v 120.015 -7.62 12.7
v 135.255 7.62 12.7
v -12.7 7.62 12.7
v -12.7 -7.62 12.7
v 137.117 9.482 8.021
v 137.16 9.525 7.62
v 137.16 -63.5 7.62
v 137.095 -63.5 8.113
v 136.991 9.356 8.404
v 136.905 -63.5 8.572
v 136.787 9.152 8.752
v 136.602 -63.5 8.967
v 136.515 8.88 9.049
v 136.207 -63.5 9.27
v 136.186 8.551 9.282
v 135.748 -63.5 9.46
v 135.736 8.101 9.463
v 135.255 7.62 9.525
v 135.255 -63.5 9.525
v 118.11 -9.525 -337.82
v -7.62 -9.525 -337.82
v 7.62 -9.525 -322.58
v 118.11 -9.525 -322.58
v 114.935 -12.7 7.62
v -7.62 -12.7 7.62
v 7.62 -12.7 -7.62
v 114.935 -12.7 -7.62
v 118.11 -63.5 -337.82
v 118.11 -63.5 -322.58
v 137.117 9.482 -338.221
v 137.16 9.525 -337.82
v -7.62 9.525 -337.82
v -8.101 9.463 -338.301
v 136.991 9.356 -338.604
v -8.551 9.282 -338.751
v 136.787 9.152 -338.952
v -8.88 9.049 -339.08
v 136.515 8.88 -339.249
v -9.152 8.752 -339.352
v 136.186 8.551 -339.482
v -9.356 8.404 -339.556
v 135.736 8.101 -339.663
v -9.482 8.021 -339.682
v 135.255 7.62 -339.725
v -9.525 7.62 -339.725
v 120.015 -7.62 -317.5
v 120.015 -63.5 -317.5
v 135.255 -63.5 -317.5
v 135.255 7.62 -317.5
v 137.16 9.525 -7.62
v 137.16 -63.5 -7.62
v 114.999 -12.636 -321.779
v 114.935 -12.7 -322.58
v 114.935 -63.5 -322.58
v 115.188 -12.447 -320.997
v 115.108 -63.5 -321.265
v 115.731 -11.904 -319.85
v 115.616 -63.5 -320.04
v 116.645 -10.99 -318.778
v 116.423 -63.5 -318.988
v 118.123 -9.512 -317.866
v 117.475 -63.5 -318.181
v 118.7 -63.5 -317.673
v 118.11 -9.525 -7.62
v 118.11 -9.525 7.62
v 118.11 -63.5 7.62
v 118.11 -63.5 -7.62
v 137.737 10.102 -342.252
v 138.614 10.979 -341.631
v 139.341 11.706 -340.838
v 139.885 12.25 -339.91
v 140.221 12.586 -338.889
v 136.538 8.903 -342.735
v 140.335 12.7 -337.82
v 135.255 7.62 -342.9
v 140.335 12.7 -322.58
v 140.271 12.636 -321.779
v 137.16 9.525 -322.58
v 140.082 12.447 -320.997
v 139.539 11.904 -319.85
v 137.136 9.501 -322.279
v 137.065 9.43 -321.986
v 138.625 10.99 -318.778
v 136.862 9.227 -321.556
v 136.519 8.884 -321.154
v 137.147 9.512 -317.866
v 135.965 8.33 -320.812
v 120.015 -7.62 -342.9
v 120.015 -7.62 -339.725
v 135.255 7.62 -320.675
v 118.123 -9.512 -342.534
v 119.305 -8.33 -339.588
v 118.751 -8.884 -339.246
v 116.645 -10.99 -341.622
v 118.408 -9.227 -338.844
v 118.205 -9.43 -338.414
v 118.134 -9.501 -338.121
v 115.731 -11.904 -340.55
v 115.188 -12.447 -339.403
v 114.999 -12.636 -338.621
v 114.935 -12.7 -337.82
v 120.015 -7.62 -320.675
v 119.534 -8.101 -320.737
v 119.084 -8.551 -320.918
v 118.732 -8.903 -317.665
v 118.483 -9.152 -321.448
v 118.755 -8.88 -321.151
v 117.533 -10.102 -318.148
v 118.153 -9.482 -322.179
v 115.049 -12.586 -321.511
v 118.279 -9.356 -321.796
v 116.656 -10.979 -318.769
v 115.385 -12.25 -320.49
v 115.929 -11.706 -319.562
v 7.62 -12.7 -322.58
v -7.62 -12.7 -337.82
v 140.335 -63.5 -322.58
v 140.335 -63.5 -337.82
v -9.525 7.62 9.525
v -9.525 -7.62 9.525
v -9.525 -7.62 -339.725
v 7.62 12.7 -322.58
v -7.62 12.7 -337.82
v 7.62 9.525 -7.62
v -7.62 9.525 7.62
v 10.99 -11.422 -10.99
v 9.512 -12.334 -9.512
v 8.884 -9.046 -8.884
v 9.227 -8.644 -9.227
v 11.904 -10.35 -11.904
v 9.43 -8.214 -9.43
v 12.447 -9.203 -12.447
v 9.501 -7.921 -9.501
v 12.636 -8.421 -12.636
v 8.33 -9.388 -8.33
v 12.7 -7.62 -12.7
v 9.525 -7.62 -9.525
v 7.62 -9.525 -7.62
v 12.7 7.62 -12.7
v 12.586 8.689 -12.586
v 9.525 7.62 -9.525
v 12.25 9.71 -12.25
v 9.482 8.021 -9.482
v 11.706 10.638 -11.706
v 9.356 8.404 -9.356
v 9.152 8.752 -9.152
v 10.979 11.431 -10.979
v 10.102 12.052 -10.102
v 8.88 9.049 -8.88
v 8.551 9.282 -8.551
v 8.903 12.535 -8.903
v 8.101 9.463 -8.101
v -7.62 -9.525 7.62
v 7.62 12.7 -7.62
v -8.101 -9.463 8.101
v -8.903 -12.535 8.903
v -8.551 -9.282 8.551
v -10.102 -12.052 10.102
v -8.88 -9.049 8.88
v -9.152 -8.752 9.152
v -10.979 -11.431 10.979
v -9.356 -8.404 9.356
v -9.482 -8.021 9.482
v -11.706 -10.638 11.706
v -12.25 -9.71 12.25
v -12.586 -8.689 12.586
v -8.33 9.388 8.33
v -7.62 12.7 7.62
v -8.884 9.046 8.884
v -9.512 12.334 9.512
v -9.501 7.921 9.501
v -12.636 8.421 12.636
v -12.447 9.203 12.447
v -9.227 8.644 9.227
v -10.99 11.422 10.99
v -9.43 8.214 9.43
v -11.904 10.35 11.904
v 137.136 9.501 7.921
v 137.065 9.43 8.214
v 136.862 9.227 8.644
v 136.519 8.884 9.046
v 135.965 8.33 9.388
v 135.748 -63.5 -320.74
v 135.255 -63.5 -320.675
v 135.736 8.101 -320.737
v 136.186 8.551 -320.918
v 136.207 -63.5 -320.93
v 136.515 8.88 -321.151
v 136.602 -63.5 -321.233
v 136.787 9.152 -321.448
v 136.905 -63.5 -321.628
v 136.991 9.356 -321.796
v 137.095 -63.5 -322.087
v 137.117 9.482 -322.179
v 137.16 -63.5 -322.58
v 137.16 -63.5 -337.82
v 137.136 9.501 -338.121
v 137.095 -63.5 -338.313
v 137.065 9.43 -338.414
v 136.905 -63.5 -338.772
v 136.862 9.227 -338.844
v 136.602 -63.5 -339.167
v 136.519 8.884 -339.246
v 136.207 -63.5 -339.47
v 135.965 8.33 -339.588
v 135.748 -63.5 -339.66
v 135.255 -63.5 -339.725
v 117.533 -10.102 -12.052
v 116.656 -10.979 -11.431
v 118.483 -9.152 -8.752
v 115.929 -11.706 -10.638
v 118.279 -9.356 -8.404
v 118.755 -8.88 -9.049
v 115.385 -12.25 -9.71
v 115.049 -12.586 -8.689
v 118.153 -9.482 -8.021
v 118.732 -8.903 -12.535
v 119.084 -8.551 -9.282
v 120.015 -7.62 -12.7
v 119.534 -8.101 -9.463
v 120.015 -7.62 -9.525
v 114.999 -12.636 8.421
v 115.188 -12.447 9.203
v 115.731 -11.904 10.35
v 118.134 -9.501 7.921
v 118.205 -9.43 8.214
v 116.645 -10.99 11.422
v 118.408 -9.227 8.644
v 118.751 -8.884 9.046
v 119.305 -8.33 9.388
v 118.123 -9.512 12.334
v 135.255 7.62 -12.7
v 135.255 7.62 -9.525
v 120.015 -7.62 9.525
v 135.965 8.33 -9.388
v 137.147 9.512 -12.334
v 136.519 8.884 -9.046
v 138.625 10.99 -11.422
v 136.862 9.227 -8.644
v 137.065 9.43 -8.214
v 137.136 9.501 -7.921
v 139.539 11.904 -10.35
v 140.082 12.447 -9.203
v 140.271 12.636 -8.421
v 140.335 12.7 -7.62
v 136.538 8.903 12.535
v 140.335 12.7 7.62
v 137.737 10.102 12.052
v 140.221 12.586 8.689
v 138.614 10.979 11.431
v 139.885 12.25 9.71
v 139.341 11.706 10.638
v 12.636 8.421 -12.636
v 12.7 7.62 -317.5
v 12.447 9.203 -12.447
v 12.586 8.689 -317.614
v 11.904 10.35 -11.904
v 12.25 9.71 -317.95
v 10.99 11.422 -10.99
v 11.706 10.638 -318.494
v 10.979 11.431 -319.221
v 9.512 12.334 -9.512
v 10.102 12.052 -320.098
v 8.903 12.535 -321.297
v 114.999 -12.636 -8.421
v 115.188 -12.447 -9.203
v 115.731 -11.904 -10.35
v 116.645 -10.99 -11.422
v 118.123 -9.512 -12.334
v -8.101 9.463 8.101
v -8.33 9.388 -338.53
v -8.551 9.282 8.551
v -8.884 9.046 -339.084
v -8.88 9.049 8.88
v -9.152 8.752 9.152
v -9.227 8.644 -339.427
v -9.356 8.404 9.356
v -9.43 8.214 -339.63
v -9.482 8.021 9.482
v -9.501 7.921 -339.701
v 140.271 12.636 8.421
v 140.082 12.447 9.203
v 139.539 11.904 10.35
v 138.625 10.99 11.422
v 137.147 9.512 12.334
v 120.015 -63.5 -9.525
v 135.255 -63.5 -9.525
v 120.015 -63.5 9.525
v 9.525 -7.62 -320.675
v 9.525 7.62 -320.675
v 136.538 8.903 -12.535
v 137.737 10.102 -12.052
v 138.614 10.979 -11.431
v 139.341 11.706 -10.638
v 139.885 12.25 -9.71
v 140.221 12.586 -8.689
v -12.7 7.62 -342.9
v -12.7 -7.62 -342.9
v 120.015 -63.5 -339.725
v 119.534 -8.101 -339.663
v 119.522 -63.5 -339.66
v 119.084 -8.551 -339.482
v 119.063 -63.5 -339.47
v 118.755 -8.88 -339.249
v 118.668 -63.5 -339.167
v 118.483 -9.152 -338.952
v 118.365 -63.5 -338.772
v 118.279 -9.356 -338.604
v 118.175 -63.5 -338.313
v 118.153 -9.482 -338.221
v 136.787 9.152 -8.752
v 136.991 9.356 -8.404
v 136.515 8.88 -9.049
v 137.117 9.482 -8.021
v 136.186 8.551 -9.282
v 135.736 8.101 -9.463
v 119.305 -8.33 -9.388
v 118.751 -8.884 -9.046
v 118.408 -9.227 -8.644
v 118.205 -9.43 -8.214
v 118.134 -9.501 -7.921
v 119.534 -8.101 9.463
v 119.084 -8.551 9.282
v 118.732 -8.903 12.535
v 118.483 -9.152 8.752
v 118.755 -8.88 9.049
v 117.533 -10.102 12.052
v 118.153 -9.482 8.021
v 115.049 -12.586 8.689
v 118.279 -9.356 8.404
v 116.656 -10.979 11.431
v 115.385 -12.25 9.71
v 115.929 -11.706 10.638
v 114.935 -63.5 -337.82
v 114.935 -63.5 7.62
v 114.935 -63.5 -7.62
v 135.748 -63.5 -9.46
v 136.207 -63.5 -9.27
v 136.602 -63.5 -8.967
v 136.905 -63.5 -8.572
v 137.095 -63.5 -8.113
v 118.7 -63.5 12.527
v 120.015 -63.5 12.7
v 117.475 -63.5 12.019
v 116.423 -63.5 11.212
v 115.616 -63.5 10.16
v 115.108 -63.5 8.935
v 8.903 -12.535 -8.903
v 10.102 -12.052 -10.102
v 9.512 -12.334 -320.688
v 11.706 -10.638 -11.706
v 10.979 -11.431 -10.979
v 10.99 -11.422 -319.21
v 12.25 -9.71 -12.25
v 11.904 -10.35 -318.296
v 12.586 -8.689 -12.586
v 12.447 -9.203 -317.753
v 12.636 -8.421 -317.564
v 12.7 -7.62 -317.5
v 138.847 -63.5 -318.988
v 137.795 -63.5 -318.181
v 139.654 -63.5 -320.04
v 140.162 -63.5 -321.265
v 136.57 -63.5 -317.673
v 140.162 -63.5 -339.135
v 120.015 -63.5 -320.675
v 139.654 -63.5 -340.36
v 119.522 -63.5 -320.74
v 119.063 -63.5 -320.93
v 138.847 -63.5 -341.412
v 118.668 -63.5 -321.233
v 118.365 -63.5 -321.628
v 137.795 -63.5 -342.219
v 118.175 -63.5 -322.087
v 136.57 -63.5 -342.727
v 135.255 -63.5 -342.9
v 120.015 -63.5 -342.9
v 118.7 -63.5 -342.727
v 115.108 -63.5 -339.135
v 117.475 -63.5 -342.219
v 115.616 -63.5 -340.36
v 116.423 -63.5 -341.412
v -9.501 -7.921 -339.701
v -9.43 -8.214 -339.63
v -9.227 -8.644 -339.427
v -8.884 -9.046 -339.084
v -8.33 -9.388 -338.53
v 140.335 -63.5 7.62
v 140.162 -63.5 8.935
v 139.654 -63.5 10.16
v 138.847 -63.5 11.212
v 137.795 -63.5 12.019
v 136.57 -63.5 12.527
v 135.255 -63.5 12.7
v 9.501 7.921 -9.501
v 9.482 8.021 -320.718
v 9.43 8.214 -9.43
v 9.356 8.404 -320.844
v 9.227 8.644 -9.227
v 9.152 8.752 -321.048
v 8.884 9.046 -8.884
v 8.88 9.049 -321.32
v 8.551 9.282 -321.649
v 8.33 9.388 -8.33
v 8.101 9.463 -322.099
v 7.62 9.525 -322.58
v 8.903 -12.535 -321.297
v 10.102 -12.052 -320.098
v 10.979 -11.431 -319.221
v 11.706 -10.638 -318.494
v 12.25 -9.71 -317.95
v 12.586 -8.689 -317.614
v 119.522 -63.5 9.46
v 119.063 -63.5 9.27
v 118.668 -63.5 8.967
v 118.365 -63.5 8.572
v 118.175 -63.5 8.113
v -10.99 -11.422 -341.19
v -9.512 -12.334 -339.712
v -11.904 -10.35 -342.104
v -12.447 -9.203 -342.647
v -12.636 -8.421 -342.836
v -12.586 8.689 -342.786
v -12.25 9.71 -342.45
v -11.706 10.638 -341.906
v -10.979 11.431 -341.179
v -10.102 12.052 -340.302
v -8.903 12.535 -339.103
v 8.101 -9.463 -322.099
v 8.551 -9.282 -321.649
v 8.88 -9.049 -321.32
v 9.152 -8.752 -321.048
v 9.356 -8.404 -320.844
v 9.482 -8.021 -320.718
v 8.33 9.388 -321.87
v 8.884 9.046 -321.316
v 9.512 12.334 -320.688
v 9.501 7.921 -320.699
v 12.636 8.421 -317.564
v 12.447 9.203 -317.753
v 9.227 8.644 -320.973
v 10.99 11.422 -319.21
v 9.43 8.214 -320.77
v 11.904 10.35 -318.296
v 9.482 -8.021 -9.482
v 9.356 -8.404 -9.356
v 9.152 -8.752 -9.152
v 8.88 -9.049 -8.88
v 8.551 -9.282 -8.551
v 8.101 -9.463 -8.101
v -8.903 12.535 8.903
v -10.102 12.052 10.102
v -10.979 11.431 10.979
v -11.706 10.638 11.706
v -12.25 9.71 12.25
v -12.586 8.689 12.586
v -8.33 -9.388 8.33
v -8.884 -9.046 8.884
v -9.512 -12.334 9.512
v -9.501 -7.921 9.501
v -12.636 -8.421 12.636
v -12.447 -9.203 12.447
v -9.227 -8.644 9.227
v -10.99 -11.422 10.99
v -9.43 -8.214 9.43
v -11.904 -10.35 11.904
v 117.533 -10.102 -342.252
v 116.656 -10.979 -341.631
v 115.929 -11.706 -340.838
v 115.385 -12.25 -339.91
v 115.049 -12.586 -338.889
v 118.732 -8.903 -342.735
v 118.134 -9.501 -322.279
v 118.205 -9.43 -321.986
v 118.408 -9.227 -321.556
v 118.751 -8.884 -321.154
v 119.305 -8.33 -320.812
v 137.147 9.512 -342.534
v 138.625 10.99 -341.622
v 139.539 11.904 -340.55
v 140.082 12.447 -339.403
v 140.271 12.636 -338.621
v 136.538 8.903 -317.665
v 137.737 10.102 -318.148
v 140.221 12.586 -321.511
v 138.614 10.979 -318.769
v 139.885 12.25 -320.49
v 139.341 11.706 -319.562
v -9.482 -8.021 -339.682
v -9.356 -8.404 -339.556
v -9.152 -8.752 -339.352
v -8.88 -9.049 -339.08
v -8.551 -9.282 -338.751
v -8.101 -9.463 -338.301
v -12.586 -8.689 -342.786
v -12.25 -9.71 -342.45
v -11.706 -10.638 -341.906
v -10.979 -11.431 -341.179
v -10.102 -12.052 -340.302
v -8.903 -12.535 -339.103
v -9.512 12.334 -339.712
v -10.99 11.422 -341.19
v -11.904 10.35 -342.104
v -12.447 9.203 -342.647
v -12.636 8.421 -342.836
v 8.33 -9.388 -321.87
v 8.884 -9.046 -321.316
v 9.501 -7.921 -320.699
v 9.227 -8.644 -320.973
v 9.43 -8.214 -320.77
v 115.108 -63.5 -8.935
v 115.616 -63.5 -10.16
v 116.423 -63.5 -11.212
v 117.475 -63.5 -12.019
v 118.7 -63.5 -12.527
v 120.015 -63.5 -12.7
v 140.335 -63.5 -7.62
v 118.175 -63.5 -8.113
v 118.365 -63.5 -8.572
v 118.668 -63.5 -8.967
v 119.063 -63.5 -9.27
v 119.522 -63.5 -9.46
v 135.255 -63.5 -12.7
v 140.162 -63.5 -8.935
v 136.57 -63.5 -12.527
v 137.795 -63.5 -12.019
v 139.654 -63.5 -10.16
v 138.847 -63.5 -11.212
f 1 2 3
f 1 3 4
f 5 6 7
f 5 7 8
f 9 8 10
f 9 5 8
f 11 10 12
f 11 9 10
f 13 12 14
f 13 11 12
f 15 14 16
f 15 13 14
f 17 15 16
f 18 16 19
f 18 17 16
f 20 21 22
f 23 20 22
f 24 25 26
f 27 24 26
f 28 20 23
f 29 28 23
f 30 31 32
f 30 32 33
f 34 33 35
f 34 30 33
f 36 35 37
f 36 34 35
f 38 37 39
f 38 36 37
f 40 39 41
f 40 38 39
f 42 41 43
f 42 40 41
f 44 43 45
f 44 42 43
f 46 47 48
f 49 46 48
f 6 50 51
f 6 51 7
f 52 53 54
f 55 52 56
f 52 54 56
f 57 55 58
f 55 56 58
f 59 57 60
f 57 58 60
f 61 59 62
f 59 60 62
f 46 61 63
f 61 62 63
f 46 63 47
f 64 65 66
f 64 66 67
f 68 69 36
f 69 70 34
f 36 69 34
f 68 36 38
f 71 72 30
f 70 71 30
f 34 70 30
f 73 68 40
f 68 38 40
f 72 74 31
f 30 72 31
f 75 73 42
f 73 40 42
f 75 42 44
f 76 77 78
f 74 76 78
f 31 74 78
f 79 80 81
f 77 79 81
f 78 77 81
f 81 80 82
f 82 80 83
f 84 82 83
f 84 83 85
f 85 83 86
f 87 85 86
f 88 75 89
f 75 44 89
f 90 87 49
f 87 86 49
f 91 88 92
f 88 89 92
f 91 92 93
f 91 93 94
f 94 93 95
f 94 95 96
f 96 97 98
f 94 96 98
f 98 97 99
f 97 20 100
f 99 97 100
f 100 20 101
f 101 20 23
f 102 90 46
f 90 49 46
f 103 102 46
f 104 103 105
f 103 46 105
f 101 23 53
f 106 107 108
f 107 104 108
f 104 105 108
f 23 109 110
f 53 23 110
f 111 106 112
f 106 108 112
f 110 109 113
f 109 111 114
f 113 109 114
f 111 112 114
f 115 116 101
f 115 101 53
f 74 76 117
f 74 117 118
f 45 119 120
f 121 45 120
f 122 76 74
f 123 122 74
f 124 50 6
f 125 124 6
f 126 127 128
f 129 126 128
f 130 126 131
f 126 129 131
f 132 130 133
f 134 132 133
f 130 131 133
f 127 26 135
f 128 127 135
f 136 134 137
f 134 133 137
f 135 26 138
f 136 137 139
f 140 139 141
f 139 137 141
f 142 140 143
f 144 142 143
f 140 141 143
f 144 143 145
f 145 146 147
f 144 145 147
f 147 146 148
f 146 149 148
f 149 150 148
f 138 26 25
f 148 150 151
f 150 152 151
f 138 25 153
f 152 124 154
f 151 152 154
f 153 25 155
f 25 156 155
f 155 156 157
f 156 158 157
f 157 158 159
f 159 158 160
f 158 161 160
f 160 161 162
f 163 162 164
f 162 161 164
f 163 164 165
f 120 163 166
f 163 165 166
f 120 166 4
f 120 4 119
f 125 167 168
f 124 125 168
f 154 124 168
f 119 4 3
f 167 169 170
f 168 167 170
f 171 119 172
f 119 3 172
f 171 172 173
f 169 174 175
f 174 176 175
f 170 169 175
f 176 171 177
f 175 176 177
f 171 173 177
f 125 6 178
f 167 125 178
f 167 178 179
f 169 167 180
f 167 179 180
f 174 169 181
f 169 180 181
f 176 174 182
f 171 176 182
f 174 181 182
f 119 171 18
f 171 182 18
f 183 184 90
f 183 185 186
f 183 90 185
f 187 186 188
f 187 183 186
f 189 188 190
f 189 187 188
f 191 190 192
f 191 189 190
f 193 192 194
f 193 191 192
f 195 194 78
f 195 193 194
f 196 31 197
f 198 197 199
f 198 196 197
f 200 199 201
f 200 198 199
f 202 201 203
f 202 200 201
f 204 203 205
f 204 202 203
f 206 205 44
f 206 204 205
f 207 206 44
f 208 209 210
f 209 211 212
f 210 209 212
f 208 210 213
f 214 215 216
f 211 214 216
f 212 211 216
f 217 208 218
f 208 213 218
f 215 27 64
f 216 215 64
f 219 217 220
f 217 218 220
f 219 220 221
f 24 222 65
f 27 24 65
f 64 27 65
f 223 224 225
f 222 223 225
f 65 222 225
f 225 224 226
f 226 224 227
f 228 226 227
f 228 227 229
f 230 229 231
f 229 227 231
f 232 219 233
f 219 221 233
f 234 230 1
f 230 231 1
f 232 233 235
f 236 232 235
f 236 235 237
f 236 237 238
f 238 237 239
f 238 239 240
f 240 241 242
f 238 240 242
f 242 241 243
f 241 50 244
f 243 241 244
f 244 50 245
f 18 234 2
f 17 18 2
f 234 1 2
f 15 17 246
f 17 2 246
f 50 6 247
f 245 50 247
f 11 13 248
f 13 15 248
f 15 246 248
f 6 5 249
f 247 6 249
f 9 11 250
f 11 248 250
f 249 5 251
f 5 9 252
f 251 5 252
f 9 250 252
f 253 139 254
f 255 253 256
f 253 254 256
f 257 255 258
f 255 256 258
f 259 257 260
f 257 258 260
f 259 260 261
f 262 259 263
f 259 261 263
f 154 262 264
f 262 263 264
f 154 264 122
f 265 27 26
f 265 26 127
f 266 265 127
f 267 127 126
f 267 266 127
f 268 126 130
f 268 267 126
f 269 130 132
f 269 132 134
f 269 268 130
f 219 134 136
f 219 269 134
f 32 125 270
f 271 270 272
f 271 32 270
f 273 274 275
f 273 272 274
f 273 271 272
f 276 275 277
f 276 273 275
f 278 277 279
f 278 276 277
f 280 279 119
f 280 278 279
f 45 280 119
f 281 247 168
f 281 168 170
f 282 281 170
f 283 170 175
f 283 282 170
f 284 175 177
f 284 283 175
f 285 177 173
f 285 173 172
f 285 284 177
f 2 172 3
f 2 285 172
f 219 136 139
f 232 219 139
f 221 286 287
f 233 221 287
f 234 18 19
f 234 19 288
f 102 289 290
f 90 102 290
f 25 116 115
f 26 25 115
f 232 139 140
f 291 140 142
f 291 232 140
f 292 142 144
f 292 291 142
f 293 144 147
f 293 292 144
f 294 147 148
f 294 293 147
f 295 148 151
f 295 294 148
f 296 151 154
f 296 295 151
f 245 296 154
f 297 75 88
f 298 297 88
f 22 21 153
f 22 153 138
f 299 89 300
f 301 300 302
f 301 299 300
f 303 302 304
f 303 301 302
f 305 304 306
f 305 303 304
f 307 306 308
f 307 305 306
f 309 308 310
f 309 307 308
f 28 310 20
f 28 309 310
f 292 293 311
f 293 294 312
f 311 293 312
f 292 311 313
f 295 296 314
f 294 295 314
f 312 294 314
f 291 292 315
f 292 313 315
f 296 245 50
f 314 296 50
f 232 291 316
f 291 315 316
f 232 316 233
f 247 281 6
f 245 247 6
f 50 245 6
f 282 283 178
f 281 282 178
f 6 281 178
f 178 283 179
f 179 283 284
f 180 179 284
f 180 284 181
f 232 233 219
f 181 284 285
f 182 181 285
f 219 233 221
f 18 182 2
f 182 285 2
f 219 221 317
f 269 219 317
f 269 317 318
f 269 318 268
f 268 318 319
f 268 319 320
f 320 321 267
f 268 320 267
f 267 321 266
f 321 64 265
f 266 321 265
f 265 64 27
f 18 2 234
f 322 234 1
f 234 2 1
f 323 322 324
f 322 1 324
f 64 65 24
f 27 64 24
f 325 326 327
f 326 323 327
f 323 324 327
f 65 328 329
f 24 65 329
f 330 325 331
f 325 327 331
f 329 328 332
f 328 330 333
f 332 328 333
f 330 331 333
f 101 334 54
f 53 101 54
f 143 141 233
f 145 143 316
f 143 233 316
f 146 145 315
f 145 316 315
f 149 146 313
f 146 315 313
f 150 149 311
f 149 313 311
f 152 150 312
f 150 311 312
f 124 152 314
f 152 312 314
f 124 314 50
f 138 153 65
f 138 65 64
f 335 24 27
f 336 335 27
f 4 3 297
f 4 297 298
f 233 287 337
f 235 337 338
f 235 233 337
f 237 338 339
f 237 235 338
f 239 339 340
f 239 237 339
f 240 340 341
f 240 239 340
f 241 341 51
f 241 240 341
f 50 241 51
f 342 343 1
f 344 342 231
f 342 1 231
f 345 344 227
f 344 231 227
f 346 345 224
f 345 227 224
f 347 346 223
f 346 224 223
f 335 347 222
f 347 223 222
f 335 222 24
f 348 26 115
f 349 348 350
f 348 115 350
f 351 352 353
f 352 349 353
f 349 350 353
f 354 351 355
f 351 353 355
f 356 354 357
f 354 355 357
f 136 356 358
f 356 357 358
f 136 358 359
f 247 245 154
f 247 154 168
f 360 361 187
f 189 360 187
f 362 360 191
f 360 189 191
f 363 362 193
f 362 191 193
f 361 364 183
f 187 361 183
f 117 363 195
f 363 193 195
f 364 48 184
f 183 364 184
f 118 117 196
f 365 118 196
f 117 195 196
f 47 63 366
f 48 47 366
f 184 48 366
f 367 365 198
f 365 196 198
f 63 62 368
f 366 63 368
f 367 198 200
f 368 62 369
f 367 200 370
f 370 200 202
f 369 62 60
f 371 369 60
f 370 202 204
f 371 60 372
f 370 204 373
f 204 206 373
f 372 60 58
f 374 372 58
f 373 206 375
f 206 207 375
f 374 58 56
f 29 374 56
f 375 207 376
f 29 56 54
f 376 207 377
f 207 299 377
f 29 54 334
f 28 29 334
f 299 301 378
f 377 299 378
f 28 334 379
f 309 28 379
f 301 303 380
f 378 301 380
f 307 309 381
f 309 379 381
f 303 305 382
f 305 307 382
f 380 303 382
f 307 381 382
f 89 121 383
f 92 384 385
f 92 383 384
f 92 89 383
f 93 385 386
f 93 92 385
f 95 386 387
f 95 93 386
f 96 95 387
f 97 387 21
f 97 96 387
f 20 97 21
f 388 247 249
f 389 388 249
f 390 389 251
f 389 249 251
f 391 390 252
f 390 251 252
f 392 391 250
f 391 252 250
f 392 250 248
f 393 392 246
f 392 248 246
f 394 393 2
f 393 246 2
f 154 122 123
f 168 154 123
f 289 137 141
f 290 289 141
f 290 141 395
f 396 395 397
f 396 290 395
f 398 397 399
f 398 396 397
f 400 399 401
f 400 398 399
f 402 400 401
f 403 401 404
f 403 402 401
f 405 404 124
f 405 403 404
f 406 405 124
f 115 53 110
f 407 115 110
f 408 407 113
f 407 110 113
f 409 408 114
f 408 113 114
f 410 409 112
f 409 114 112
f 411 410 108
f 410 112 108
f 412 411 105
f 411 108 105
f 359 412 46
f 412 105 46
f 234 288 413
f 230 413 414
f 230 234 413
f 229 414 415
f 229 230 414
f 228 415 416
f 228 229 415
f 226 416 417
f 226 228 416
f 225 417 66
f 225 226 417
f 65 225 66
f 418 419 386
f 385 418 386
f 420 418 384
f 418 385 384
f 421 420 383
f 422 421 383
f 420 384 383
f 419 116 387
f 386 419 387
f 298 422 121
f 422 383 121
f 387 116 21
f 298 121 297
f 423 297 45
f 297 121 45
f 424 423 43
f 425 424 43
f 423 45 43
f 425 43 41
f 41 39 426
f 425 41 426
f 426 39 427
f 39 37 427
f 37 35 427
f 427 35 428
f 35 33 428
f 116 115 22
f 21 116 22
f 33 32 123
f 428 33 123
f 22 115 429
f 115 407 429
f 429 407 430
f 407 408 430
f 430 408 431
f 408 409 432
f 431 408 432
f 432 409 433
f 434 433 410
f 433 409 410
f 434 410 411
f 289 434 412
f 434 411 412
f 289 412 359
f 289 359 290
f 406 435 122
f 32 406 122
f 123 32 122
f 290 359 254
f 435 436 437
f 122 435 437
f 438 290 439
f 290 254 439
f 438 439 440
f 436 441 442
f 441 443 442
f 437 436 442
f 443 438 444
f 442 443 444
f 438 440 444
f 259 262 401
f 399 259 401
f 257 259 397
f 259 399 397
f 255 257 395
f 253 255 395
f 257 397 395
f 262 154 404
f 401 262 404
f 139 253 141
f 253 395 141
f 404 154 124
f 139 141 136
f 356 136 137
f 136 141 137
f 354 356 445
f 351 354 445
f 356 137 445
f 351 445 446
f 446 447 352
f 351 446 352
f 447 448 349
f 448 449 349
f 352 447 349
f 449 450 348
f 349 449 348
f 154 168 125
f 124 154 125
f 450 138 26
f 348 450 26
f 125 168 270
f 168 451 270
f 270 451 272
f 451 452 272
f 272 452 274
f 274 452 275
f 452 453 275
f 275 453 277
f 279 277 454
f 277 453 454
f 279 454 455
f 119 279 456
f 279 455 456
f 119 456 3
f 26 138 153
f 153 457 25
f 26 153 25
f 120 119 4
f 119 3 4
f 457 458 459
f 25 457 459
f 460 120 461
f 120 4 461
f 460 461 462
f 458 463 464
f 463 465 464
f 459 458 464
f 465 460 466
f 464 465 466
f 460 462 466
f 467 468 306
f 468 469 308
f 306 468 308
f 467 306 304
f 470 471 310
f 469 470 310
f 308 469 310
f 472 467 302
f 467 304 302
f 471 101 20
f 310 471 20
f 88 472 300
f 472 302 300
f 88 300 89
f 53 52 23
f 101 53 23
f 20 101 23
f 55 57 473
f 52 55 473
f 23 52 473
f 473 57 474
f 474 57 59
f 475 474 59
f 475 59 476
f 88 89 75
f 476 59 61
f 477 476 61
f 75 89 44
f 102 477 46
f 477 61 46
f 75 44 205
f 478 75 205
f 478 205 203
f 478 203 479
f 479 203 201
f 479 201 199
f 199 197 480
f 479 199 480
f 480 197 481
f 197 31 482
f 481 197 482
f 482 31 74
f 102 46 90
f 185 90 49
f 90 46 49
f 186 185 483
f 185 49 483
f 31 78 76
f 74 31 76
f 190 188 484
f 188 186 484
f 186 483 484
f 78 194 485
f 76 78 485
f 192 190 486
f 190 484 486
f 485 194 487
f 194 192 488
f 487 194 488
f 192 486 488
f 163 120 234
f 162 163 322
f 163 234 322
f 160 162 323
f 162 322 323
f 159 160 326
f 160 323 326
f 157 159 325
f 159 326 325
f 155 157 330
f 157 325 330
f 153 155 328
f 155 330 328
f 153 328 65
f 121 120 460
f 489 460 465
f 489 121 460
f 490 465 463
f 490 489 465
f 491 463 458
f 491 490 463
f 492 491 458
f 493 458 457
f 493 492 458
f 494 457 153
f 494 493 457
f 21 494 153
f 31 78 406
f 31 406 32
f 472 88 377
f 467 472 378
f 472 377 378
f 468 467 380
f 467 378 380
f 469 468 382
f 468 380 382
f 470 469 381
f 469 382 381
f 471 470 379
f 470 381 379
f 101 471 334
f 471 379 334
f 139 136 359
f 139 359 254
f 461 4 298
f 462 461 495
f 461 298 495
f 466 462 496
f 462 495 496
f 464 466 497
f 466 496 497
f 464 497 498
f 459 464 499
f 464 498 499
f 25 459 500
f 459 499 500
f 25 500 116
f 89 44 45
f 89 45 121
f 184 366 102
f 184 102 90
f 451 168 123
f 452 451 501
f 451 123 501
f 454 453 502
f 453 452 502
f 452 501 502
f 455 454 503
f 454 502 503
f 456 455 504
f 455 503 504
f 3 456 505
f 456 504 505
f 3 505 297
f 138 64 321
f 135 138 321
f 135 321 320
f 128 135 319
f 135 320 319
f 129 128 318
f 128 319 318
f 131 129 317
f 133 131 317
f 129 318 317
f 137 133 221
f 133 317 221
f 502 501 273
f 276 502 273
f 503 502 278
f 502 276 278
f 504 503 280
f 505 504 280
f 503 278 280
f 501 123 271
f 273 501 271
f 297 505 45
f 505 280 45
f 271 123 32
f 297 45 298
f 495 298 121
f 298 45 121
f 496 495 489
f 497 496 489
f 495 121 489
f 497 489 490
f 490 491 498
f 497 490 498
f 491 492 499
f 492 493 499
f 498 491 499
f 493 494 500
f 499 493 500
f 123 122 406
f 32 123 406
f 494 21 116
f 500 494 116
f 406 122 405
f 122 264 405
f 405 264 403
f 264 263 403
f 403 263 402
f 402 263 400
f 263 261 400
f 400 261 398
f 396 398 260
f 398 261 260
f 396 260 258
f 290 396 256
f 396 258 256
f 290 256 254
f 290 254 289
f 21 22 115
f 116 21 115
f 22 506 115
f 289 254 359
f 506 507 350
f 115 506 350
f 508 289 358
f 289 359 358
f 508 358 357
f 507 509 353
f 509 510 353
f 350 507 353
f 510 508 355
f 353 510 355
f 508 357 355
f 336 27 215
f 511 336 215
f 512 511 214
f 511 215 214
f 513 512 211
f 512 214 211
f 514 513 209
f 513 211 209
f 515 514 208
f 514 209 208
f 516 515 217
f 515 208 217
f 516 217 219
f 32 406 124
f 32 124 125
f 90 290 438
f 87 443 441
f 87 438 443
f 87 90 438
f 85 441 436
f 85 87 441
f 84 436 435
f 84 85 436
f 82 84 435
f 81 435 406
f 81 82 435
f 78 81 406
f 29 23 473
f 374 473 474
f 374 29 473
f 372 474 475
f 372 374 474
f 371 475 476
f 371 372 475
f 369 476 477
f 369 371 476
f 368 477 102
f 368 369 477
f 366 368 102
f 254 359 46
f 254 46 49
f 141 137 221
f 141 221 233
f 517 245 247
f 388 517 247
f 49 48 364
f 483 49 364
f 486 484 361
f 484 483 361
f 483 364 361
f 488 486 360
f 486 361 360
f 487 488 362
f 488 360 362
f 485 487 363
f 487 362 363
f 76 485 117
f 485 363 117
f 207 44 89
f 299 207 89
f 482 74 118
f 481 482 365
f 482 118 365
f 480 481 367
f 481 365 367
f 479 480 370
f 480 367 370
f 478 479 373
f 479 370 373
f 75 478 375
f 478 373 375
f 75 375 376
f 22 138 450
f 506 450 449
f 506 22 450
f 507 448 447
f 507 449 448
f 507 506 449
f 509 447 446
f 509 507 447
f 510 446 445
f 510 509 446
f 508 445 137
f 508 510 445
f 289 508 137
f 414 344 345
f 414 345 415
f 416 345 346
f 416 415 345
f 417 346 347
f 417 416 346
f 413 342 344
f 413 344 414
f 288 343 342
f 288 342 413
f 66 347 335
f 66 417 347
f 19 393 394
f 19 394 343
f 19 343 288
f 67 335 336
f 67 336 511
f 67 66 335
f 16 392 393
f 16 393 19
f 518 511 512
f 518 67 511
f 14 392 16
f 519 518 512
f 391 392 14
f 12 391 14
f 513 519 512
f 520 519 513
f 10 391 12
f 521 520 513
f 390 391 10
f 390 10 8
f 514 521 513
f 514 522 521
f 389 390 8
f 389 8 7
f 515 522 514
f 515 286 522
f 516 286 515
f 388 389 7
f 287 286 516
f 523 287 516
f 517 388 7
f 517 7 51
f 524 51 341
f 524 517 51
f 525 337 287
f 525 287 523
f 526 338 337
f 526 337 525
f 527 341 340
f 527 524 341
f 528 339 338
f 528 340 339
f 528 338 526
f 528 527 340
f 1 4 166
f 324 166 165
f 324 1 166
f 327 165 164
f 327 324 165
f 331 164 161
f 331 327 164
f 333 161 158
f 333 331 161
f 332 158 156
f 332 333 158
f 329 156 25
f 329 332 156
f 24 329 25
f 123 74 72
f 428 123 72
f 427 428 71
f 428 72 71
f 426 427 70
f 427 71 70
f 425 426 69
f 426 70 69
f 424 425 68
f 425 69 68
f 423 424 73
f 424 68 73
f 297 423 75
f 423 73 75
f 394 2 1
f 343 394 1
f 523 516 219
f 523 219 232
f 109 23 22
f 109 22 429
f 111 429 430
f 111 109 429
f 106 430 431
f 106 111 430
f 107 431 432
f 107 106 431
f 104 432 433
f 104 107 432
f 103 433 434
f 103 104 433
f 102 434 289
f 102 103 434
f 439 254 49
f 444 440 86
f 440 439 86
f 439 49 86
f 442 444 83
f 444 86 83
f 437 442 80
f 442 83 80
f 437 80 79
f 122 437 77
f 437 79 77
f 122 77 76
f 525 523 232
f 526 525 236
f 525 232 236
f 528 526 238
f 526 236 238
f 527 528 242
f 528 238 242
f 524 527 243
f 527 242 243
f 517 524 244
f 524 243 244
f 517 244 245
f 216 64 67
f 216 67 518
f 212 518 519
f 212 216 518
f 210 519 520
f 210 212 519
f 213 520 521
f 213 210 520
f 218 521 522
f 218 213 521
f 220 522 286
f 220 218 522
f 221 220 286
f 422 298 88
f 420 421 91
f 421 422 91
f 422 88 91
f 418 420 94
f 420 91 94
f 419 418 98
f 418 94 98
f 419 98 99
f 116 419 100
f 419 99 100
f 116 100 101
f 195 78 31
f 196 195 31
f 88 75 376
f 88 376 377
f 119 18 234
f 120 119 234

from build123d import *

# Parameters (mm, degrees)
SQUARE_TUBING_1_X_1_X_0_125_1_DEPTH        = 82.460512242
SQUARE_TUBING_1_X_1_X_0_125_1_2_DEPTH      = 165.556024484
SQUARE_TUBING_1_X_1_X_0_125_1_3_DEPTH      = 368.121024484
SQUARE_TUBING_1_X_1_X_0_125_1_4_DEPTH      = 146.595512242
SQUARE_TUBING_1_X_1_X_0_125_1_4_DEPTH_BACK = 18.960512242
SQUARE_TUBING_1_X_1_X_0_125_1_5_DEPTH      = 82.460512242


with BuildPart() as part:
    # Sketch1 on segment 1 (carried to segment 1) → Square tubing 1 X 1 X 0.125(1) (new body)
    with BuildSketch(Plane(origin=(127.635, -63.5, -330.2), x_dir=(0, 0, -1), z_dir=(0, 1, 0))):
        with BuildLine():
            Line((-7.62, -12.7), (7.62, -12.7))
            ThreePointArc((7.62, -12.7), (11.212102448, -11.212102448), (12.7, -7.62))
            Line((12.7, -7.62), (12.7, 7.62))
            ThreePointArc((12.7, 7.62), (11.212102448, 11.212102448), (7.62, 12.7))
            Line((7.62, 12.7), (-7.62, 12.7))
            ThreePointArc((-7.62, 12.7), (-11.212102448, 11.212102448), (-12.7, 7.62))
            Line((-12.7, 7.62), (-12.7, -7.62))
            ThreePointArc((-12.7, -7.62), (-11.212102448, -11.212102448), (-7.62, -12.7))
        make_face()
        with BuildLine():
            Line((-7.62, -9.525), (7.62, -9.525))
            ThreePointArc((7.62, -9.525), (8.967038418, -8.967038418), (9.525, -7.62))
            Line((9.525, -7.62), (9.525, 7.62))
            ThreePointArc((9.525, 7.62), (8.967038418, 8.967038418), (7.62, 9.525))
            Line((7.62, 9.525), (-7.62, 9.525))
            ThreePointArc((-7.62, 9.525), (-8.967038418, 8.967038418), (-9.525, 7.62))
            Line((-9.525, 7.62), (-9.525, -7.62))
            ThreePointArc((-9.525, -7.62), (-8.967038418, -8.967038418), (-7.62, -9.525))
        make_face(mode=Mode.SUBTRACT)
    extrude(amount=SQUARE_TUBING_1_X_1_X_0_125_1_DEPTH)

    # Square tubing 1 X 1 X 0.125(1) mitre 1
    split(bisect_by=Plane(origin=(127.635, 0, -330.2), x_dir=(0.707106781, 0.707106781, 0), z_dir=(0.707106781, -0.707106781, 0)), keep=Keep.TOP)


with BuildPart() as body_2:
    # Sketch1 on segment 2 (carried to segment 2) → Square tubing 1 X 1 X 0.125_1 2 (new body)
    with BuildSketch(Plane(origin=(146.595512242, 0, -330.2), x_dir=(0, 0, 1), z_dir=(-1, 0, 0))):
        with BuildLine():
            Line((-7.62, -12.7), (7.62, -12.7))
            ThreePointArc((7.62, -12.7), (11.212102448, -11.212102448), (12.7, -7.62))
            Line((12.7, -7.62), (12.7, 7.62))
            ThreePointArc((12.7, 7.62), (11.212102448, 11.212102448), (7.62, 12.7))
            Line((7.62, 12.7), (-7.62, 12.7))
            ThreePointArc((-7.62, 12.7), (-11.212102448, 11.212102448), (-12.7, 7.62))
            Line((-12.7, 7.62), (-12.7, -7.62))
            ThreePointArc((-12.7, -7.62), (-11.212102448, -11.212102448), (-7.62, -12.7))
        make_face()
        with BuildLine():
            Line((-7.62, -9.525), (7.62, -9.525))
            ThreePointArc((7.62, -9.525), (8.967038418, -8.967038418), (9.525, -7.62))
            Line((9.525, -7.62), (9.525, 7.62))
            ThreePointArc((9.525, 7.62), (8.967038418, 8.967038418), (7.62, 9.525))
            Line((7.62, 9.525), (-7.62, 9.525))
            ThreePointArc((-7.62, 9.525), (-8.967038418, 8.967038418), (-9.525, 7.62))
            Line((-9.525, 7.62), (-9.525, -7.62))
            ThreePointArc((-9.525, -7.62), (-8.967038418, -8.967038418), (-7.62, -9.525))
        make_face(mode=Mode.SUBTRACT)
    extrude(amount=SQUARE_TUBING_1_X_1_X_0_125_1_2_DEPTH)

    # Square tubing 1 X 1 X 0.125_1 2 mitre 1
    split(bisect_by=Plane(origin=(0, 0, -330.2), x_dir=(0, 1, 0), z_dir=(0.707106781, 0, -0.707106781)), keep=Keep.TOP)

    # Square tubing 1 X 1 X 0.125_1 2 mitre 2
    split(bisect_by=Plane(origin=(127.635, 0, -330.2), x_dir=(-0.707106781, -0.707106781, 0), z_dir=(-0.707106781, 0.707106781, 0)), keep=Keep.TOP)


with BuildPart() as body_3:
    # Sketch1 on segment 3 (carried to segment 3) → Square tubing 1 X 1 X 0.125_1 3 (new body)
    with BuildSketch(Plane.XY.offset(-349.160512242)):
        with BuildLine():
            Line((-7.62, -12.7), (7.62, -12.7))
            ThreePointArc((7.62, -12.7), (11.212102448, -11.212102448), (12.7, -7.62))
            Line((12.7, -7.62), (12.7, 7.62))
            ThreePointArc((12.7, 7.62), (11.212102448, 11.212102448), (7.62, 12.7))
            Line((7.62, 12.7), (-7.62, 12.7))
            ThreePointArc((-7.62, 12.7), (-11.212102448, 11.212102448), (-12.7, 7.62))
            Line((-12.7, 7.62), (-12.7, -7.62))
            ThreePointArc((-12.7, -7.62), (-11.212102448, -11.212102448), (-7.62, -12.7))
        make_face()
        with BuildLine():
            Line((-7.62, -9.525), (7.62, -9.525))
            ThreePointArc((7.62, -9.525), (8.967038418, -8.967038418), (9.525, -7.62))
            Line((9.525, -7.62), (9.525, 7.62))
            ThreePointArc((9.525, 7.62), (8.967038418, 8.967038418), (7.62, 9.525))
            Line((7.62, 9.525), (-7.62, 9.525))
            ThreePointArc((-7.62, 9.525), (-8.967038418, 8.967038418), (-9.525, 7.62))
            Line((-9.525, 7.62), (-9.525, -7.62))
            ThreePointArc((-9.525, -7.62), (-8.967038418, -8.967038418), (-7.62, -9.525))
        make_face(mode=Mode.SUBTRACT)
    extrude(amount=SQUARE_TUBING_1_X_1_X_0_125_1_3_DEPTH)

    # Square tubing 1 X 1 X 0.125_1 3 mitre 1
    split(bisect_by=Plane(origin=(0, 0, 0), x_dir=(0, -1, 0), z_dir=(-0.707106781, 0, -0.707106781)), keep=Keep.TOP)

    # Square tubing 1 X 1 X 0.125_1 3 mitre 2
    split(bisect_by=Plane(origin=(0, 0, -330.2), x_dir=(0, -1, 0), z_dir=(-0.707106781, 0, 0.707106781)), keep=Keep.TOP)


with BuildPart() as body_4:
    # Sketch1 → Square tubing 1 X 1 X 0.125_1 4 (new, two sides)
    with BuildSketch(Plane(origin=(0, 0, 0), x_dir=(0, 0, -1), z_dir=(1, 0, 0))) as square_tubing_1_x_1_x_0_125_1_4_sk:
        with BuildLine():
            Line((-7.62, -12.7), (7.62, -12.7))
            ThreePointArc((7.62, -12.7), (11.212102448, -11.212102448), (12.7, -7.62))
            Line((12.7, -7.62), (12.7, 7.62))
            ThreePointArc((12.7, 7.62), (11.212102448, 11.212102448), (7.62, 12.7))
            Line((7.62, 12.7), (-7.62, 12.7))
            ThreePointArc((-7.62, 12.7), (-11.212102448, 11.212102448), (-12.7, 7.62))
            Line((-12.7, 7.62), (-12.7, -7.62))
            ThreePointArc((-12.7, -7.62), (-11.212102448, -11.212102448), (-7.62, -12.7))
        make_face()
        with BuildLine():
            Line((-7.62, -9.525), (7.62, -9.525))
            ThreePointArc((7.62, -9.525), (8.967038418, -8.967038418), (9.525, -7.62))
            Line((9.525, -7.62), (9.525, 7.62))
            ThreePointArc((9.525, 7.62), (8.967038418, 8.967038418), (7.62, 9.525))
            Line((7.62, 9.525), (-7.62, 9.525))
            ThreePointArc((-7.62, 9.525), (-8.967038418, 8.967038418), (-9.525, 7.62))
            Line((-9.525, 7.62), (-9.525, -7.62))
            ThreePointArc((-9.525, -7.62), (-8.967038418, -8.967038418), (-7.62, -9.525))
        make_face(mode=Mode.SUBTRACT)
    extrude(amount=SQUARE_TUBING_1_X_1_X_0_125_1_4_DEPTH)
    extrude(square_tubing_1_x_1_x_0_125_1_4_sk.sketch, amount=-SQUARE_TUBING_1_X_1_X_0_125_1_4_DEPTH_BACK)

    # Square tubing 1 X 1 X 0.125_1 4 mitre 1
    split(bisect_by=Plane(origin=(0, 0, 0), x_dir=(0, 1, 0), z_dir=(0.707106781, 0, 0.707106781)), keep=Keep.TOP)

    # Square tubing 1 X 1 X 0.125_1 4 mitre 2
    split(bisect_by=Plane(origin=(127.635, 0, 0), x_dir=(-0.707106781, -0.707106781, 0), z_dir=(-0.707106781, 0.707106781, 0)), keep=Keep.TOP)


with BuildPart() as body_5:
    # Sketch1 on segment 5 (carried to segment 5) → Square tubing 1 X 1 X 0.125_1 5 (new body)
    with BuildSketch(Plane(origin=(127.635, 18.960512242, 0), x_dir=(0, 0, -1), z_dir=(0, -1, 0))):
        with BuildLine():
            Line((-7.62, -12.7), (7.62, -12.7))
            ThreePointArc((7.62, -12.7), (11.212102448, -11.212102448), (12.7, -7.62))
            Line((12.7, -7.62), (12.7, 7.62))
            ThreePointArc((12.7, 7.62), (11.212102448, 11.212102448), (7.62, 12.7))
            Line((7.62, 12.7), (-7.62, 12.7))
            ThreePointArc((-7.62, 12.7), (-11.212102448, 11.212102448), (-12.7, 7.62))
            Line((-12.7, 7.62), (-12.7, -7.62))
            ThreePointArc((-12.7, -7.62), (-11.212102448, -11.212102448), (-7.62, -12.7))
        make_face()
        with BuildLine():
            Line((-7.62, -9.525), (7.62, -9.525))
            ThreePointArc((7.62, -9.525), (8.967038418, -8.967038418), (9.525, -7.62))
            Line((9.525, -7.62), (9.525, 7.62))
            ThreePointArc((9.525, 7.62), (8.967038418, 8.967038418), (7.62, 9.525))
            Line((7.62, 9.525), (-7.62, 9.525))
            ThreePointArc((-7.62, 9.525), (-8.967038418, 8.967038418), (-9.525, 7.62))
            Line((-9.525, 7.62), (-9.525, -7.62))
            ThreePointArc((-9.525, -7.62), (-8.967038418, -8.967038418), (-7.62, -9.525))
        make_face(mode=Mode.SUBTRACT)
    extrude(amount=SQUARE_TUBING_1_X_1_X_0_125_1_5_DEPTH)

    # Square tubing 1 X 1 X 0.125_1 5 mitre 1
    split(bisect_by=Plane(origin=(127.635, 0, 0), x_dir=(0.707106781, 0.707106781, 0), z_dir=(0.707106781, -0.707106781, 0)), keep=Keep.TOP)


solid = Compound([part.part, body_2.part, body_3.part, body_4.part, body_5.part])
